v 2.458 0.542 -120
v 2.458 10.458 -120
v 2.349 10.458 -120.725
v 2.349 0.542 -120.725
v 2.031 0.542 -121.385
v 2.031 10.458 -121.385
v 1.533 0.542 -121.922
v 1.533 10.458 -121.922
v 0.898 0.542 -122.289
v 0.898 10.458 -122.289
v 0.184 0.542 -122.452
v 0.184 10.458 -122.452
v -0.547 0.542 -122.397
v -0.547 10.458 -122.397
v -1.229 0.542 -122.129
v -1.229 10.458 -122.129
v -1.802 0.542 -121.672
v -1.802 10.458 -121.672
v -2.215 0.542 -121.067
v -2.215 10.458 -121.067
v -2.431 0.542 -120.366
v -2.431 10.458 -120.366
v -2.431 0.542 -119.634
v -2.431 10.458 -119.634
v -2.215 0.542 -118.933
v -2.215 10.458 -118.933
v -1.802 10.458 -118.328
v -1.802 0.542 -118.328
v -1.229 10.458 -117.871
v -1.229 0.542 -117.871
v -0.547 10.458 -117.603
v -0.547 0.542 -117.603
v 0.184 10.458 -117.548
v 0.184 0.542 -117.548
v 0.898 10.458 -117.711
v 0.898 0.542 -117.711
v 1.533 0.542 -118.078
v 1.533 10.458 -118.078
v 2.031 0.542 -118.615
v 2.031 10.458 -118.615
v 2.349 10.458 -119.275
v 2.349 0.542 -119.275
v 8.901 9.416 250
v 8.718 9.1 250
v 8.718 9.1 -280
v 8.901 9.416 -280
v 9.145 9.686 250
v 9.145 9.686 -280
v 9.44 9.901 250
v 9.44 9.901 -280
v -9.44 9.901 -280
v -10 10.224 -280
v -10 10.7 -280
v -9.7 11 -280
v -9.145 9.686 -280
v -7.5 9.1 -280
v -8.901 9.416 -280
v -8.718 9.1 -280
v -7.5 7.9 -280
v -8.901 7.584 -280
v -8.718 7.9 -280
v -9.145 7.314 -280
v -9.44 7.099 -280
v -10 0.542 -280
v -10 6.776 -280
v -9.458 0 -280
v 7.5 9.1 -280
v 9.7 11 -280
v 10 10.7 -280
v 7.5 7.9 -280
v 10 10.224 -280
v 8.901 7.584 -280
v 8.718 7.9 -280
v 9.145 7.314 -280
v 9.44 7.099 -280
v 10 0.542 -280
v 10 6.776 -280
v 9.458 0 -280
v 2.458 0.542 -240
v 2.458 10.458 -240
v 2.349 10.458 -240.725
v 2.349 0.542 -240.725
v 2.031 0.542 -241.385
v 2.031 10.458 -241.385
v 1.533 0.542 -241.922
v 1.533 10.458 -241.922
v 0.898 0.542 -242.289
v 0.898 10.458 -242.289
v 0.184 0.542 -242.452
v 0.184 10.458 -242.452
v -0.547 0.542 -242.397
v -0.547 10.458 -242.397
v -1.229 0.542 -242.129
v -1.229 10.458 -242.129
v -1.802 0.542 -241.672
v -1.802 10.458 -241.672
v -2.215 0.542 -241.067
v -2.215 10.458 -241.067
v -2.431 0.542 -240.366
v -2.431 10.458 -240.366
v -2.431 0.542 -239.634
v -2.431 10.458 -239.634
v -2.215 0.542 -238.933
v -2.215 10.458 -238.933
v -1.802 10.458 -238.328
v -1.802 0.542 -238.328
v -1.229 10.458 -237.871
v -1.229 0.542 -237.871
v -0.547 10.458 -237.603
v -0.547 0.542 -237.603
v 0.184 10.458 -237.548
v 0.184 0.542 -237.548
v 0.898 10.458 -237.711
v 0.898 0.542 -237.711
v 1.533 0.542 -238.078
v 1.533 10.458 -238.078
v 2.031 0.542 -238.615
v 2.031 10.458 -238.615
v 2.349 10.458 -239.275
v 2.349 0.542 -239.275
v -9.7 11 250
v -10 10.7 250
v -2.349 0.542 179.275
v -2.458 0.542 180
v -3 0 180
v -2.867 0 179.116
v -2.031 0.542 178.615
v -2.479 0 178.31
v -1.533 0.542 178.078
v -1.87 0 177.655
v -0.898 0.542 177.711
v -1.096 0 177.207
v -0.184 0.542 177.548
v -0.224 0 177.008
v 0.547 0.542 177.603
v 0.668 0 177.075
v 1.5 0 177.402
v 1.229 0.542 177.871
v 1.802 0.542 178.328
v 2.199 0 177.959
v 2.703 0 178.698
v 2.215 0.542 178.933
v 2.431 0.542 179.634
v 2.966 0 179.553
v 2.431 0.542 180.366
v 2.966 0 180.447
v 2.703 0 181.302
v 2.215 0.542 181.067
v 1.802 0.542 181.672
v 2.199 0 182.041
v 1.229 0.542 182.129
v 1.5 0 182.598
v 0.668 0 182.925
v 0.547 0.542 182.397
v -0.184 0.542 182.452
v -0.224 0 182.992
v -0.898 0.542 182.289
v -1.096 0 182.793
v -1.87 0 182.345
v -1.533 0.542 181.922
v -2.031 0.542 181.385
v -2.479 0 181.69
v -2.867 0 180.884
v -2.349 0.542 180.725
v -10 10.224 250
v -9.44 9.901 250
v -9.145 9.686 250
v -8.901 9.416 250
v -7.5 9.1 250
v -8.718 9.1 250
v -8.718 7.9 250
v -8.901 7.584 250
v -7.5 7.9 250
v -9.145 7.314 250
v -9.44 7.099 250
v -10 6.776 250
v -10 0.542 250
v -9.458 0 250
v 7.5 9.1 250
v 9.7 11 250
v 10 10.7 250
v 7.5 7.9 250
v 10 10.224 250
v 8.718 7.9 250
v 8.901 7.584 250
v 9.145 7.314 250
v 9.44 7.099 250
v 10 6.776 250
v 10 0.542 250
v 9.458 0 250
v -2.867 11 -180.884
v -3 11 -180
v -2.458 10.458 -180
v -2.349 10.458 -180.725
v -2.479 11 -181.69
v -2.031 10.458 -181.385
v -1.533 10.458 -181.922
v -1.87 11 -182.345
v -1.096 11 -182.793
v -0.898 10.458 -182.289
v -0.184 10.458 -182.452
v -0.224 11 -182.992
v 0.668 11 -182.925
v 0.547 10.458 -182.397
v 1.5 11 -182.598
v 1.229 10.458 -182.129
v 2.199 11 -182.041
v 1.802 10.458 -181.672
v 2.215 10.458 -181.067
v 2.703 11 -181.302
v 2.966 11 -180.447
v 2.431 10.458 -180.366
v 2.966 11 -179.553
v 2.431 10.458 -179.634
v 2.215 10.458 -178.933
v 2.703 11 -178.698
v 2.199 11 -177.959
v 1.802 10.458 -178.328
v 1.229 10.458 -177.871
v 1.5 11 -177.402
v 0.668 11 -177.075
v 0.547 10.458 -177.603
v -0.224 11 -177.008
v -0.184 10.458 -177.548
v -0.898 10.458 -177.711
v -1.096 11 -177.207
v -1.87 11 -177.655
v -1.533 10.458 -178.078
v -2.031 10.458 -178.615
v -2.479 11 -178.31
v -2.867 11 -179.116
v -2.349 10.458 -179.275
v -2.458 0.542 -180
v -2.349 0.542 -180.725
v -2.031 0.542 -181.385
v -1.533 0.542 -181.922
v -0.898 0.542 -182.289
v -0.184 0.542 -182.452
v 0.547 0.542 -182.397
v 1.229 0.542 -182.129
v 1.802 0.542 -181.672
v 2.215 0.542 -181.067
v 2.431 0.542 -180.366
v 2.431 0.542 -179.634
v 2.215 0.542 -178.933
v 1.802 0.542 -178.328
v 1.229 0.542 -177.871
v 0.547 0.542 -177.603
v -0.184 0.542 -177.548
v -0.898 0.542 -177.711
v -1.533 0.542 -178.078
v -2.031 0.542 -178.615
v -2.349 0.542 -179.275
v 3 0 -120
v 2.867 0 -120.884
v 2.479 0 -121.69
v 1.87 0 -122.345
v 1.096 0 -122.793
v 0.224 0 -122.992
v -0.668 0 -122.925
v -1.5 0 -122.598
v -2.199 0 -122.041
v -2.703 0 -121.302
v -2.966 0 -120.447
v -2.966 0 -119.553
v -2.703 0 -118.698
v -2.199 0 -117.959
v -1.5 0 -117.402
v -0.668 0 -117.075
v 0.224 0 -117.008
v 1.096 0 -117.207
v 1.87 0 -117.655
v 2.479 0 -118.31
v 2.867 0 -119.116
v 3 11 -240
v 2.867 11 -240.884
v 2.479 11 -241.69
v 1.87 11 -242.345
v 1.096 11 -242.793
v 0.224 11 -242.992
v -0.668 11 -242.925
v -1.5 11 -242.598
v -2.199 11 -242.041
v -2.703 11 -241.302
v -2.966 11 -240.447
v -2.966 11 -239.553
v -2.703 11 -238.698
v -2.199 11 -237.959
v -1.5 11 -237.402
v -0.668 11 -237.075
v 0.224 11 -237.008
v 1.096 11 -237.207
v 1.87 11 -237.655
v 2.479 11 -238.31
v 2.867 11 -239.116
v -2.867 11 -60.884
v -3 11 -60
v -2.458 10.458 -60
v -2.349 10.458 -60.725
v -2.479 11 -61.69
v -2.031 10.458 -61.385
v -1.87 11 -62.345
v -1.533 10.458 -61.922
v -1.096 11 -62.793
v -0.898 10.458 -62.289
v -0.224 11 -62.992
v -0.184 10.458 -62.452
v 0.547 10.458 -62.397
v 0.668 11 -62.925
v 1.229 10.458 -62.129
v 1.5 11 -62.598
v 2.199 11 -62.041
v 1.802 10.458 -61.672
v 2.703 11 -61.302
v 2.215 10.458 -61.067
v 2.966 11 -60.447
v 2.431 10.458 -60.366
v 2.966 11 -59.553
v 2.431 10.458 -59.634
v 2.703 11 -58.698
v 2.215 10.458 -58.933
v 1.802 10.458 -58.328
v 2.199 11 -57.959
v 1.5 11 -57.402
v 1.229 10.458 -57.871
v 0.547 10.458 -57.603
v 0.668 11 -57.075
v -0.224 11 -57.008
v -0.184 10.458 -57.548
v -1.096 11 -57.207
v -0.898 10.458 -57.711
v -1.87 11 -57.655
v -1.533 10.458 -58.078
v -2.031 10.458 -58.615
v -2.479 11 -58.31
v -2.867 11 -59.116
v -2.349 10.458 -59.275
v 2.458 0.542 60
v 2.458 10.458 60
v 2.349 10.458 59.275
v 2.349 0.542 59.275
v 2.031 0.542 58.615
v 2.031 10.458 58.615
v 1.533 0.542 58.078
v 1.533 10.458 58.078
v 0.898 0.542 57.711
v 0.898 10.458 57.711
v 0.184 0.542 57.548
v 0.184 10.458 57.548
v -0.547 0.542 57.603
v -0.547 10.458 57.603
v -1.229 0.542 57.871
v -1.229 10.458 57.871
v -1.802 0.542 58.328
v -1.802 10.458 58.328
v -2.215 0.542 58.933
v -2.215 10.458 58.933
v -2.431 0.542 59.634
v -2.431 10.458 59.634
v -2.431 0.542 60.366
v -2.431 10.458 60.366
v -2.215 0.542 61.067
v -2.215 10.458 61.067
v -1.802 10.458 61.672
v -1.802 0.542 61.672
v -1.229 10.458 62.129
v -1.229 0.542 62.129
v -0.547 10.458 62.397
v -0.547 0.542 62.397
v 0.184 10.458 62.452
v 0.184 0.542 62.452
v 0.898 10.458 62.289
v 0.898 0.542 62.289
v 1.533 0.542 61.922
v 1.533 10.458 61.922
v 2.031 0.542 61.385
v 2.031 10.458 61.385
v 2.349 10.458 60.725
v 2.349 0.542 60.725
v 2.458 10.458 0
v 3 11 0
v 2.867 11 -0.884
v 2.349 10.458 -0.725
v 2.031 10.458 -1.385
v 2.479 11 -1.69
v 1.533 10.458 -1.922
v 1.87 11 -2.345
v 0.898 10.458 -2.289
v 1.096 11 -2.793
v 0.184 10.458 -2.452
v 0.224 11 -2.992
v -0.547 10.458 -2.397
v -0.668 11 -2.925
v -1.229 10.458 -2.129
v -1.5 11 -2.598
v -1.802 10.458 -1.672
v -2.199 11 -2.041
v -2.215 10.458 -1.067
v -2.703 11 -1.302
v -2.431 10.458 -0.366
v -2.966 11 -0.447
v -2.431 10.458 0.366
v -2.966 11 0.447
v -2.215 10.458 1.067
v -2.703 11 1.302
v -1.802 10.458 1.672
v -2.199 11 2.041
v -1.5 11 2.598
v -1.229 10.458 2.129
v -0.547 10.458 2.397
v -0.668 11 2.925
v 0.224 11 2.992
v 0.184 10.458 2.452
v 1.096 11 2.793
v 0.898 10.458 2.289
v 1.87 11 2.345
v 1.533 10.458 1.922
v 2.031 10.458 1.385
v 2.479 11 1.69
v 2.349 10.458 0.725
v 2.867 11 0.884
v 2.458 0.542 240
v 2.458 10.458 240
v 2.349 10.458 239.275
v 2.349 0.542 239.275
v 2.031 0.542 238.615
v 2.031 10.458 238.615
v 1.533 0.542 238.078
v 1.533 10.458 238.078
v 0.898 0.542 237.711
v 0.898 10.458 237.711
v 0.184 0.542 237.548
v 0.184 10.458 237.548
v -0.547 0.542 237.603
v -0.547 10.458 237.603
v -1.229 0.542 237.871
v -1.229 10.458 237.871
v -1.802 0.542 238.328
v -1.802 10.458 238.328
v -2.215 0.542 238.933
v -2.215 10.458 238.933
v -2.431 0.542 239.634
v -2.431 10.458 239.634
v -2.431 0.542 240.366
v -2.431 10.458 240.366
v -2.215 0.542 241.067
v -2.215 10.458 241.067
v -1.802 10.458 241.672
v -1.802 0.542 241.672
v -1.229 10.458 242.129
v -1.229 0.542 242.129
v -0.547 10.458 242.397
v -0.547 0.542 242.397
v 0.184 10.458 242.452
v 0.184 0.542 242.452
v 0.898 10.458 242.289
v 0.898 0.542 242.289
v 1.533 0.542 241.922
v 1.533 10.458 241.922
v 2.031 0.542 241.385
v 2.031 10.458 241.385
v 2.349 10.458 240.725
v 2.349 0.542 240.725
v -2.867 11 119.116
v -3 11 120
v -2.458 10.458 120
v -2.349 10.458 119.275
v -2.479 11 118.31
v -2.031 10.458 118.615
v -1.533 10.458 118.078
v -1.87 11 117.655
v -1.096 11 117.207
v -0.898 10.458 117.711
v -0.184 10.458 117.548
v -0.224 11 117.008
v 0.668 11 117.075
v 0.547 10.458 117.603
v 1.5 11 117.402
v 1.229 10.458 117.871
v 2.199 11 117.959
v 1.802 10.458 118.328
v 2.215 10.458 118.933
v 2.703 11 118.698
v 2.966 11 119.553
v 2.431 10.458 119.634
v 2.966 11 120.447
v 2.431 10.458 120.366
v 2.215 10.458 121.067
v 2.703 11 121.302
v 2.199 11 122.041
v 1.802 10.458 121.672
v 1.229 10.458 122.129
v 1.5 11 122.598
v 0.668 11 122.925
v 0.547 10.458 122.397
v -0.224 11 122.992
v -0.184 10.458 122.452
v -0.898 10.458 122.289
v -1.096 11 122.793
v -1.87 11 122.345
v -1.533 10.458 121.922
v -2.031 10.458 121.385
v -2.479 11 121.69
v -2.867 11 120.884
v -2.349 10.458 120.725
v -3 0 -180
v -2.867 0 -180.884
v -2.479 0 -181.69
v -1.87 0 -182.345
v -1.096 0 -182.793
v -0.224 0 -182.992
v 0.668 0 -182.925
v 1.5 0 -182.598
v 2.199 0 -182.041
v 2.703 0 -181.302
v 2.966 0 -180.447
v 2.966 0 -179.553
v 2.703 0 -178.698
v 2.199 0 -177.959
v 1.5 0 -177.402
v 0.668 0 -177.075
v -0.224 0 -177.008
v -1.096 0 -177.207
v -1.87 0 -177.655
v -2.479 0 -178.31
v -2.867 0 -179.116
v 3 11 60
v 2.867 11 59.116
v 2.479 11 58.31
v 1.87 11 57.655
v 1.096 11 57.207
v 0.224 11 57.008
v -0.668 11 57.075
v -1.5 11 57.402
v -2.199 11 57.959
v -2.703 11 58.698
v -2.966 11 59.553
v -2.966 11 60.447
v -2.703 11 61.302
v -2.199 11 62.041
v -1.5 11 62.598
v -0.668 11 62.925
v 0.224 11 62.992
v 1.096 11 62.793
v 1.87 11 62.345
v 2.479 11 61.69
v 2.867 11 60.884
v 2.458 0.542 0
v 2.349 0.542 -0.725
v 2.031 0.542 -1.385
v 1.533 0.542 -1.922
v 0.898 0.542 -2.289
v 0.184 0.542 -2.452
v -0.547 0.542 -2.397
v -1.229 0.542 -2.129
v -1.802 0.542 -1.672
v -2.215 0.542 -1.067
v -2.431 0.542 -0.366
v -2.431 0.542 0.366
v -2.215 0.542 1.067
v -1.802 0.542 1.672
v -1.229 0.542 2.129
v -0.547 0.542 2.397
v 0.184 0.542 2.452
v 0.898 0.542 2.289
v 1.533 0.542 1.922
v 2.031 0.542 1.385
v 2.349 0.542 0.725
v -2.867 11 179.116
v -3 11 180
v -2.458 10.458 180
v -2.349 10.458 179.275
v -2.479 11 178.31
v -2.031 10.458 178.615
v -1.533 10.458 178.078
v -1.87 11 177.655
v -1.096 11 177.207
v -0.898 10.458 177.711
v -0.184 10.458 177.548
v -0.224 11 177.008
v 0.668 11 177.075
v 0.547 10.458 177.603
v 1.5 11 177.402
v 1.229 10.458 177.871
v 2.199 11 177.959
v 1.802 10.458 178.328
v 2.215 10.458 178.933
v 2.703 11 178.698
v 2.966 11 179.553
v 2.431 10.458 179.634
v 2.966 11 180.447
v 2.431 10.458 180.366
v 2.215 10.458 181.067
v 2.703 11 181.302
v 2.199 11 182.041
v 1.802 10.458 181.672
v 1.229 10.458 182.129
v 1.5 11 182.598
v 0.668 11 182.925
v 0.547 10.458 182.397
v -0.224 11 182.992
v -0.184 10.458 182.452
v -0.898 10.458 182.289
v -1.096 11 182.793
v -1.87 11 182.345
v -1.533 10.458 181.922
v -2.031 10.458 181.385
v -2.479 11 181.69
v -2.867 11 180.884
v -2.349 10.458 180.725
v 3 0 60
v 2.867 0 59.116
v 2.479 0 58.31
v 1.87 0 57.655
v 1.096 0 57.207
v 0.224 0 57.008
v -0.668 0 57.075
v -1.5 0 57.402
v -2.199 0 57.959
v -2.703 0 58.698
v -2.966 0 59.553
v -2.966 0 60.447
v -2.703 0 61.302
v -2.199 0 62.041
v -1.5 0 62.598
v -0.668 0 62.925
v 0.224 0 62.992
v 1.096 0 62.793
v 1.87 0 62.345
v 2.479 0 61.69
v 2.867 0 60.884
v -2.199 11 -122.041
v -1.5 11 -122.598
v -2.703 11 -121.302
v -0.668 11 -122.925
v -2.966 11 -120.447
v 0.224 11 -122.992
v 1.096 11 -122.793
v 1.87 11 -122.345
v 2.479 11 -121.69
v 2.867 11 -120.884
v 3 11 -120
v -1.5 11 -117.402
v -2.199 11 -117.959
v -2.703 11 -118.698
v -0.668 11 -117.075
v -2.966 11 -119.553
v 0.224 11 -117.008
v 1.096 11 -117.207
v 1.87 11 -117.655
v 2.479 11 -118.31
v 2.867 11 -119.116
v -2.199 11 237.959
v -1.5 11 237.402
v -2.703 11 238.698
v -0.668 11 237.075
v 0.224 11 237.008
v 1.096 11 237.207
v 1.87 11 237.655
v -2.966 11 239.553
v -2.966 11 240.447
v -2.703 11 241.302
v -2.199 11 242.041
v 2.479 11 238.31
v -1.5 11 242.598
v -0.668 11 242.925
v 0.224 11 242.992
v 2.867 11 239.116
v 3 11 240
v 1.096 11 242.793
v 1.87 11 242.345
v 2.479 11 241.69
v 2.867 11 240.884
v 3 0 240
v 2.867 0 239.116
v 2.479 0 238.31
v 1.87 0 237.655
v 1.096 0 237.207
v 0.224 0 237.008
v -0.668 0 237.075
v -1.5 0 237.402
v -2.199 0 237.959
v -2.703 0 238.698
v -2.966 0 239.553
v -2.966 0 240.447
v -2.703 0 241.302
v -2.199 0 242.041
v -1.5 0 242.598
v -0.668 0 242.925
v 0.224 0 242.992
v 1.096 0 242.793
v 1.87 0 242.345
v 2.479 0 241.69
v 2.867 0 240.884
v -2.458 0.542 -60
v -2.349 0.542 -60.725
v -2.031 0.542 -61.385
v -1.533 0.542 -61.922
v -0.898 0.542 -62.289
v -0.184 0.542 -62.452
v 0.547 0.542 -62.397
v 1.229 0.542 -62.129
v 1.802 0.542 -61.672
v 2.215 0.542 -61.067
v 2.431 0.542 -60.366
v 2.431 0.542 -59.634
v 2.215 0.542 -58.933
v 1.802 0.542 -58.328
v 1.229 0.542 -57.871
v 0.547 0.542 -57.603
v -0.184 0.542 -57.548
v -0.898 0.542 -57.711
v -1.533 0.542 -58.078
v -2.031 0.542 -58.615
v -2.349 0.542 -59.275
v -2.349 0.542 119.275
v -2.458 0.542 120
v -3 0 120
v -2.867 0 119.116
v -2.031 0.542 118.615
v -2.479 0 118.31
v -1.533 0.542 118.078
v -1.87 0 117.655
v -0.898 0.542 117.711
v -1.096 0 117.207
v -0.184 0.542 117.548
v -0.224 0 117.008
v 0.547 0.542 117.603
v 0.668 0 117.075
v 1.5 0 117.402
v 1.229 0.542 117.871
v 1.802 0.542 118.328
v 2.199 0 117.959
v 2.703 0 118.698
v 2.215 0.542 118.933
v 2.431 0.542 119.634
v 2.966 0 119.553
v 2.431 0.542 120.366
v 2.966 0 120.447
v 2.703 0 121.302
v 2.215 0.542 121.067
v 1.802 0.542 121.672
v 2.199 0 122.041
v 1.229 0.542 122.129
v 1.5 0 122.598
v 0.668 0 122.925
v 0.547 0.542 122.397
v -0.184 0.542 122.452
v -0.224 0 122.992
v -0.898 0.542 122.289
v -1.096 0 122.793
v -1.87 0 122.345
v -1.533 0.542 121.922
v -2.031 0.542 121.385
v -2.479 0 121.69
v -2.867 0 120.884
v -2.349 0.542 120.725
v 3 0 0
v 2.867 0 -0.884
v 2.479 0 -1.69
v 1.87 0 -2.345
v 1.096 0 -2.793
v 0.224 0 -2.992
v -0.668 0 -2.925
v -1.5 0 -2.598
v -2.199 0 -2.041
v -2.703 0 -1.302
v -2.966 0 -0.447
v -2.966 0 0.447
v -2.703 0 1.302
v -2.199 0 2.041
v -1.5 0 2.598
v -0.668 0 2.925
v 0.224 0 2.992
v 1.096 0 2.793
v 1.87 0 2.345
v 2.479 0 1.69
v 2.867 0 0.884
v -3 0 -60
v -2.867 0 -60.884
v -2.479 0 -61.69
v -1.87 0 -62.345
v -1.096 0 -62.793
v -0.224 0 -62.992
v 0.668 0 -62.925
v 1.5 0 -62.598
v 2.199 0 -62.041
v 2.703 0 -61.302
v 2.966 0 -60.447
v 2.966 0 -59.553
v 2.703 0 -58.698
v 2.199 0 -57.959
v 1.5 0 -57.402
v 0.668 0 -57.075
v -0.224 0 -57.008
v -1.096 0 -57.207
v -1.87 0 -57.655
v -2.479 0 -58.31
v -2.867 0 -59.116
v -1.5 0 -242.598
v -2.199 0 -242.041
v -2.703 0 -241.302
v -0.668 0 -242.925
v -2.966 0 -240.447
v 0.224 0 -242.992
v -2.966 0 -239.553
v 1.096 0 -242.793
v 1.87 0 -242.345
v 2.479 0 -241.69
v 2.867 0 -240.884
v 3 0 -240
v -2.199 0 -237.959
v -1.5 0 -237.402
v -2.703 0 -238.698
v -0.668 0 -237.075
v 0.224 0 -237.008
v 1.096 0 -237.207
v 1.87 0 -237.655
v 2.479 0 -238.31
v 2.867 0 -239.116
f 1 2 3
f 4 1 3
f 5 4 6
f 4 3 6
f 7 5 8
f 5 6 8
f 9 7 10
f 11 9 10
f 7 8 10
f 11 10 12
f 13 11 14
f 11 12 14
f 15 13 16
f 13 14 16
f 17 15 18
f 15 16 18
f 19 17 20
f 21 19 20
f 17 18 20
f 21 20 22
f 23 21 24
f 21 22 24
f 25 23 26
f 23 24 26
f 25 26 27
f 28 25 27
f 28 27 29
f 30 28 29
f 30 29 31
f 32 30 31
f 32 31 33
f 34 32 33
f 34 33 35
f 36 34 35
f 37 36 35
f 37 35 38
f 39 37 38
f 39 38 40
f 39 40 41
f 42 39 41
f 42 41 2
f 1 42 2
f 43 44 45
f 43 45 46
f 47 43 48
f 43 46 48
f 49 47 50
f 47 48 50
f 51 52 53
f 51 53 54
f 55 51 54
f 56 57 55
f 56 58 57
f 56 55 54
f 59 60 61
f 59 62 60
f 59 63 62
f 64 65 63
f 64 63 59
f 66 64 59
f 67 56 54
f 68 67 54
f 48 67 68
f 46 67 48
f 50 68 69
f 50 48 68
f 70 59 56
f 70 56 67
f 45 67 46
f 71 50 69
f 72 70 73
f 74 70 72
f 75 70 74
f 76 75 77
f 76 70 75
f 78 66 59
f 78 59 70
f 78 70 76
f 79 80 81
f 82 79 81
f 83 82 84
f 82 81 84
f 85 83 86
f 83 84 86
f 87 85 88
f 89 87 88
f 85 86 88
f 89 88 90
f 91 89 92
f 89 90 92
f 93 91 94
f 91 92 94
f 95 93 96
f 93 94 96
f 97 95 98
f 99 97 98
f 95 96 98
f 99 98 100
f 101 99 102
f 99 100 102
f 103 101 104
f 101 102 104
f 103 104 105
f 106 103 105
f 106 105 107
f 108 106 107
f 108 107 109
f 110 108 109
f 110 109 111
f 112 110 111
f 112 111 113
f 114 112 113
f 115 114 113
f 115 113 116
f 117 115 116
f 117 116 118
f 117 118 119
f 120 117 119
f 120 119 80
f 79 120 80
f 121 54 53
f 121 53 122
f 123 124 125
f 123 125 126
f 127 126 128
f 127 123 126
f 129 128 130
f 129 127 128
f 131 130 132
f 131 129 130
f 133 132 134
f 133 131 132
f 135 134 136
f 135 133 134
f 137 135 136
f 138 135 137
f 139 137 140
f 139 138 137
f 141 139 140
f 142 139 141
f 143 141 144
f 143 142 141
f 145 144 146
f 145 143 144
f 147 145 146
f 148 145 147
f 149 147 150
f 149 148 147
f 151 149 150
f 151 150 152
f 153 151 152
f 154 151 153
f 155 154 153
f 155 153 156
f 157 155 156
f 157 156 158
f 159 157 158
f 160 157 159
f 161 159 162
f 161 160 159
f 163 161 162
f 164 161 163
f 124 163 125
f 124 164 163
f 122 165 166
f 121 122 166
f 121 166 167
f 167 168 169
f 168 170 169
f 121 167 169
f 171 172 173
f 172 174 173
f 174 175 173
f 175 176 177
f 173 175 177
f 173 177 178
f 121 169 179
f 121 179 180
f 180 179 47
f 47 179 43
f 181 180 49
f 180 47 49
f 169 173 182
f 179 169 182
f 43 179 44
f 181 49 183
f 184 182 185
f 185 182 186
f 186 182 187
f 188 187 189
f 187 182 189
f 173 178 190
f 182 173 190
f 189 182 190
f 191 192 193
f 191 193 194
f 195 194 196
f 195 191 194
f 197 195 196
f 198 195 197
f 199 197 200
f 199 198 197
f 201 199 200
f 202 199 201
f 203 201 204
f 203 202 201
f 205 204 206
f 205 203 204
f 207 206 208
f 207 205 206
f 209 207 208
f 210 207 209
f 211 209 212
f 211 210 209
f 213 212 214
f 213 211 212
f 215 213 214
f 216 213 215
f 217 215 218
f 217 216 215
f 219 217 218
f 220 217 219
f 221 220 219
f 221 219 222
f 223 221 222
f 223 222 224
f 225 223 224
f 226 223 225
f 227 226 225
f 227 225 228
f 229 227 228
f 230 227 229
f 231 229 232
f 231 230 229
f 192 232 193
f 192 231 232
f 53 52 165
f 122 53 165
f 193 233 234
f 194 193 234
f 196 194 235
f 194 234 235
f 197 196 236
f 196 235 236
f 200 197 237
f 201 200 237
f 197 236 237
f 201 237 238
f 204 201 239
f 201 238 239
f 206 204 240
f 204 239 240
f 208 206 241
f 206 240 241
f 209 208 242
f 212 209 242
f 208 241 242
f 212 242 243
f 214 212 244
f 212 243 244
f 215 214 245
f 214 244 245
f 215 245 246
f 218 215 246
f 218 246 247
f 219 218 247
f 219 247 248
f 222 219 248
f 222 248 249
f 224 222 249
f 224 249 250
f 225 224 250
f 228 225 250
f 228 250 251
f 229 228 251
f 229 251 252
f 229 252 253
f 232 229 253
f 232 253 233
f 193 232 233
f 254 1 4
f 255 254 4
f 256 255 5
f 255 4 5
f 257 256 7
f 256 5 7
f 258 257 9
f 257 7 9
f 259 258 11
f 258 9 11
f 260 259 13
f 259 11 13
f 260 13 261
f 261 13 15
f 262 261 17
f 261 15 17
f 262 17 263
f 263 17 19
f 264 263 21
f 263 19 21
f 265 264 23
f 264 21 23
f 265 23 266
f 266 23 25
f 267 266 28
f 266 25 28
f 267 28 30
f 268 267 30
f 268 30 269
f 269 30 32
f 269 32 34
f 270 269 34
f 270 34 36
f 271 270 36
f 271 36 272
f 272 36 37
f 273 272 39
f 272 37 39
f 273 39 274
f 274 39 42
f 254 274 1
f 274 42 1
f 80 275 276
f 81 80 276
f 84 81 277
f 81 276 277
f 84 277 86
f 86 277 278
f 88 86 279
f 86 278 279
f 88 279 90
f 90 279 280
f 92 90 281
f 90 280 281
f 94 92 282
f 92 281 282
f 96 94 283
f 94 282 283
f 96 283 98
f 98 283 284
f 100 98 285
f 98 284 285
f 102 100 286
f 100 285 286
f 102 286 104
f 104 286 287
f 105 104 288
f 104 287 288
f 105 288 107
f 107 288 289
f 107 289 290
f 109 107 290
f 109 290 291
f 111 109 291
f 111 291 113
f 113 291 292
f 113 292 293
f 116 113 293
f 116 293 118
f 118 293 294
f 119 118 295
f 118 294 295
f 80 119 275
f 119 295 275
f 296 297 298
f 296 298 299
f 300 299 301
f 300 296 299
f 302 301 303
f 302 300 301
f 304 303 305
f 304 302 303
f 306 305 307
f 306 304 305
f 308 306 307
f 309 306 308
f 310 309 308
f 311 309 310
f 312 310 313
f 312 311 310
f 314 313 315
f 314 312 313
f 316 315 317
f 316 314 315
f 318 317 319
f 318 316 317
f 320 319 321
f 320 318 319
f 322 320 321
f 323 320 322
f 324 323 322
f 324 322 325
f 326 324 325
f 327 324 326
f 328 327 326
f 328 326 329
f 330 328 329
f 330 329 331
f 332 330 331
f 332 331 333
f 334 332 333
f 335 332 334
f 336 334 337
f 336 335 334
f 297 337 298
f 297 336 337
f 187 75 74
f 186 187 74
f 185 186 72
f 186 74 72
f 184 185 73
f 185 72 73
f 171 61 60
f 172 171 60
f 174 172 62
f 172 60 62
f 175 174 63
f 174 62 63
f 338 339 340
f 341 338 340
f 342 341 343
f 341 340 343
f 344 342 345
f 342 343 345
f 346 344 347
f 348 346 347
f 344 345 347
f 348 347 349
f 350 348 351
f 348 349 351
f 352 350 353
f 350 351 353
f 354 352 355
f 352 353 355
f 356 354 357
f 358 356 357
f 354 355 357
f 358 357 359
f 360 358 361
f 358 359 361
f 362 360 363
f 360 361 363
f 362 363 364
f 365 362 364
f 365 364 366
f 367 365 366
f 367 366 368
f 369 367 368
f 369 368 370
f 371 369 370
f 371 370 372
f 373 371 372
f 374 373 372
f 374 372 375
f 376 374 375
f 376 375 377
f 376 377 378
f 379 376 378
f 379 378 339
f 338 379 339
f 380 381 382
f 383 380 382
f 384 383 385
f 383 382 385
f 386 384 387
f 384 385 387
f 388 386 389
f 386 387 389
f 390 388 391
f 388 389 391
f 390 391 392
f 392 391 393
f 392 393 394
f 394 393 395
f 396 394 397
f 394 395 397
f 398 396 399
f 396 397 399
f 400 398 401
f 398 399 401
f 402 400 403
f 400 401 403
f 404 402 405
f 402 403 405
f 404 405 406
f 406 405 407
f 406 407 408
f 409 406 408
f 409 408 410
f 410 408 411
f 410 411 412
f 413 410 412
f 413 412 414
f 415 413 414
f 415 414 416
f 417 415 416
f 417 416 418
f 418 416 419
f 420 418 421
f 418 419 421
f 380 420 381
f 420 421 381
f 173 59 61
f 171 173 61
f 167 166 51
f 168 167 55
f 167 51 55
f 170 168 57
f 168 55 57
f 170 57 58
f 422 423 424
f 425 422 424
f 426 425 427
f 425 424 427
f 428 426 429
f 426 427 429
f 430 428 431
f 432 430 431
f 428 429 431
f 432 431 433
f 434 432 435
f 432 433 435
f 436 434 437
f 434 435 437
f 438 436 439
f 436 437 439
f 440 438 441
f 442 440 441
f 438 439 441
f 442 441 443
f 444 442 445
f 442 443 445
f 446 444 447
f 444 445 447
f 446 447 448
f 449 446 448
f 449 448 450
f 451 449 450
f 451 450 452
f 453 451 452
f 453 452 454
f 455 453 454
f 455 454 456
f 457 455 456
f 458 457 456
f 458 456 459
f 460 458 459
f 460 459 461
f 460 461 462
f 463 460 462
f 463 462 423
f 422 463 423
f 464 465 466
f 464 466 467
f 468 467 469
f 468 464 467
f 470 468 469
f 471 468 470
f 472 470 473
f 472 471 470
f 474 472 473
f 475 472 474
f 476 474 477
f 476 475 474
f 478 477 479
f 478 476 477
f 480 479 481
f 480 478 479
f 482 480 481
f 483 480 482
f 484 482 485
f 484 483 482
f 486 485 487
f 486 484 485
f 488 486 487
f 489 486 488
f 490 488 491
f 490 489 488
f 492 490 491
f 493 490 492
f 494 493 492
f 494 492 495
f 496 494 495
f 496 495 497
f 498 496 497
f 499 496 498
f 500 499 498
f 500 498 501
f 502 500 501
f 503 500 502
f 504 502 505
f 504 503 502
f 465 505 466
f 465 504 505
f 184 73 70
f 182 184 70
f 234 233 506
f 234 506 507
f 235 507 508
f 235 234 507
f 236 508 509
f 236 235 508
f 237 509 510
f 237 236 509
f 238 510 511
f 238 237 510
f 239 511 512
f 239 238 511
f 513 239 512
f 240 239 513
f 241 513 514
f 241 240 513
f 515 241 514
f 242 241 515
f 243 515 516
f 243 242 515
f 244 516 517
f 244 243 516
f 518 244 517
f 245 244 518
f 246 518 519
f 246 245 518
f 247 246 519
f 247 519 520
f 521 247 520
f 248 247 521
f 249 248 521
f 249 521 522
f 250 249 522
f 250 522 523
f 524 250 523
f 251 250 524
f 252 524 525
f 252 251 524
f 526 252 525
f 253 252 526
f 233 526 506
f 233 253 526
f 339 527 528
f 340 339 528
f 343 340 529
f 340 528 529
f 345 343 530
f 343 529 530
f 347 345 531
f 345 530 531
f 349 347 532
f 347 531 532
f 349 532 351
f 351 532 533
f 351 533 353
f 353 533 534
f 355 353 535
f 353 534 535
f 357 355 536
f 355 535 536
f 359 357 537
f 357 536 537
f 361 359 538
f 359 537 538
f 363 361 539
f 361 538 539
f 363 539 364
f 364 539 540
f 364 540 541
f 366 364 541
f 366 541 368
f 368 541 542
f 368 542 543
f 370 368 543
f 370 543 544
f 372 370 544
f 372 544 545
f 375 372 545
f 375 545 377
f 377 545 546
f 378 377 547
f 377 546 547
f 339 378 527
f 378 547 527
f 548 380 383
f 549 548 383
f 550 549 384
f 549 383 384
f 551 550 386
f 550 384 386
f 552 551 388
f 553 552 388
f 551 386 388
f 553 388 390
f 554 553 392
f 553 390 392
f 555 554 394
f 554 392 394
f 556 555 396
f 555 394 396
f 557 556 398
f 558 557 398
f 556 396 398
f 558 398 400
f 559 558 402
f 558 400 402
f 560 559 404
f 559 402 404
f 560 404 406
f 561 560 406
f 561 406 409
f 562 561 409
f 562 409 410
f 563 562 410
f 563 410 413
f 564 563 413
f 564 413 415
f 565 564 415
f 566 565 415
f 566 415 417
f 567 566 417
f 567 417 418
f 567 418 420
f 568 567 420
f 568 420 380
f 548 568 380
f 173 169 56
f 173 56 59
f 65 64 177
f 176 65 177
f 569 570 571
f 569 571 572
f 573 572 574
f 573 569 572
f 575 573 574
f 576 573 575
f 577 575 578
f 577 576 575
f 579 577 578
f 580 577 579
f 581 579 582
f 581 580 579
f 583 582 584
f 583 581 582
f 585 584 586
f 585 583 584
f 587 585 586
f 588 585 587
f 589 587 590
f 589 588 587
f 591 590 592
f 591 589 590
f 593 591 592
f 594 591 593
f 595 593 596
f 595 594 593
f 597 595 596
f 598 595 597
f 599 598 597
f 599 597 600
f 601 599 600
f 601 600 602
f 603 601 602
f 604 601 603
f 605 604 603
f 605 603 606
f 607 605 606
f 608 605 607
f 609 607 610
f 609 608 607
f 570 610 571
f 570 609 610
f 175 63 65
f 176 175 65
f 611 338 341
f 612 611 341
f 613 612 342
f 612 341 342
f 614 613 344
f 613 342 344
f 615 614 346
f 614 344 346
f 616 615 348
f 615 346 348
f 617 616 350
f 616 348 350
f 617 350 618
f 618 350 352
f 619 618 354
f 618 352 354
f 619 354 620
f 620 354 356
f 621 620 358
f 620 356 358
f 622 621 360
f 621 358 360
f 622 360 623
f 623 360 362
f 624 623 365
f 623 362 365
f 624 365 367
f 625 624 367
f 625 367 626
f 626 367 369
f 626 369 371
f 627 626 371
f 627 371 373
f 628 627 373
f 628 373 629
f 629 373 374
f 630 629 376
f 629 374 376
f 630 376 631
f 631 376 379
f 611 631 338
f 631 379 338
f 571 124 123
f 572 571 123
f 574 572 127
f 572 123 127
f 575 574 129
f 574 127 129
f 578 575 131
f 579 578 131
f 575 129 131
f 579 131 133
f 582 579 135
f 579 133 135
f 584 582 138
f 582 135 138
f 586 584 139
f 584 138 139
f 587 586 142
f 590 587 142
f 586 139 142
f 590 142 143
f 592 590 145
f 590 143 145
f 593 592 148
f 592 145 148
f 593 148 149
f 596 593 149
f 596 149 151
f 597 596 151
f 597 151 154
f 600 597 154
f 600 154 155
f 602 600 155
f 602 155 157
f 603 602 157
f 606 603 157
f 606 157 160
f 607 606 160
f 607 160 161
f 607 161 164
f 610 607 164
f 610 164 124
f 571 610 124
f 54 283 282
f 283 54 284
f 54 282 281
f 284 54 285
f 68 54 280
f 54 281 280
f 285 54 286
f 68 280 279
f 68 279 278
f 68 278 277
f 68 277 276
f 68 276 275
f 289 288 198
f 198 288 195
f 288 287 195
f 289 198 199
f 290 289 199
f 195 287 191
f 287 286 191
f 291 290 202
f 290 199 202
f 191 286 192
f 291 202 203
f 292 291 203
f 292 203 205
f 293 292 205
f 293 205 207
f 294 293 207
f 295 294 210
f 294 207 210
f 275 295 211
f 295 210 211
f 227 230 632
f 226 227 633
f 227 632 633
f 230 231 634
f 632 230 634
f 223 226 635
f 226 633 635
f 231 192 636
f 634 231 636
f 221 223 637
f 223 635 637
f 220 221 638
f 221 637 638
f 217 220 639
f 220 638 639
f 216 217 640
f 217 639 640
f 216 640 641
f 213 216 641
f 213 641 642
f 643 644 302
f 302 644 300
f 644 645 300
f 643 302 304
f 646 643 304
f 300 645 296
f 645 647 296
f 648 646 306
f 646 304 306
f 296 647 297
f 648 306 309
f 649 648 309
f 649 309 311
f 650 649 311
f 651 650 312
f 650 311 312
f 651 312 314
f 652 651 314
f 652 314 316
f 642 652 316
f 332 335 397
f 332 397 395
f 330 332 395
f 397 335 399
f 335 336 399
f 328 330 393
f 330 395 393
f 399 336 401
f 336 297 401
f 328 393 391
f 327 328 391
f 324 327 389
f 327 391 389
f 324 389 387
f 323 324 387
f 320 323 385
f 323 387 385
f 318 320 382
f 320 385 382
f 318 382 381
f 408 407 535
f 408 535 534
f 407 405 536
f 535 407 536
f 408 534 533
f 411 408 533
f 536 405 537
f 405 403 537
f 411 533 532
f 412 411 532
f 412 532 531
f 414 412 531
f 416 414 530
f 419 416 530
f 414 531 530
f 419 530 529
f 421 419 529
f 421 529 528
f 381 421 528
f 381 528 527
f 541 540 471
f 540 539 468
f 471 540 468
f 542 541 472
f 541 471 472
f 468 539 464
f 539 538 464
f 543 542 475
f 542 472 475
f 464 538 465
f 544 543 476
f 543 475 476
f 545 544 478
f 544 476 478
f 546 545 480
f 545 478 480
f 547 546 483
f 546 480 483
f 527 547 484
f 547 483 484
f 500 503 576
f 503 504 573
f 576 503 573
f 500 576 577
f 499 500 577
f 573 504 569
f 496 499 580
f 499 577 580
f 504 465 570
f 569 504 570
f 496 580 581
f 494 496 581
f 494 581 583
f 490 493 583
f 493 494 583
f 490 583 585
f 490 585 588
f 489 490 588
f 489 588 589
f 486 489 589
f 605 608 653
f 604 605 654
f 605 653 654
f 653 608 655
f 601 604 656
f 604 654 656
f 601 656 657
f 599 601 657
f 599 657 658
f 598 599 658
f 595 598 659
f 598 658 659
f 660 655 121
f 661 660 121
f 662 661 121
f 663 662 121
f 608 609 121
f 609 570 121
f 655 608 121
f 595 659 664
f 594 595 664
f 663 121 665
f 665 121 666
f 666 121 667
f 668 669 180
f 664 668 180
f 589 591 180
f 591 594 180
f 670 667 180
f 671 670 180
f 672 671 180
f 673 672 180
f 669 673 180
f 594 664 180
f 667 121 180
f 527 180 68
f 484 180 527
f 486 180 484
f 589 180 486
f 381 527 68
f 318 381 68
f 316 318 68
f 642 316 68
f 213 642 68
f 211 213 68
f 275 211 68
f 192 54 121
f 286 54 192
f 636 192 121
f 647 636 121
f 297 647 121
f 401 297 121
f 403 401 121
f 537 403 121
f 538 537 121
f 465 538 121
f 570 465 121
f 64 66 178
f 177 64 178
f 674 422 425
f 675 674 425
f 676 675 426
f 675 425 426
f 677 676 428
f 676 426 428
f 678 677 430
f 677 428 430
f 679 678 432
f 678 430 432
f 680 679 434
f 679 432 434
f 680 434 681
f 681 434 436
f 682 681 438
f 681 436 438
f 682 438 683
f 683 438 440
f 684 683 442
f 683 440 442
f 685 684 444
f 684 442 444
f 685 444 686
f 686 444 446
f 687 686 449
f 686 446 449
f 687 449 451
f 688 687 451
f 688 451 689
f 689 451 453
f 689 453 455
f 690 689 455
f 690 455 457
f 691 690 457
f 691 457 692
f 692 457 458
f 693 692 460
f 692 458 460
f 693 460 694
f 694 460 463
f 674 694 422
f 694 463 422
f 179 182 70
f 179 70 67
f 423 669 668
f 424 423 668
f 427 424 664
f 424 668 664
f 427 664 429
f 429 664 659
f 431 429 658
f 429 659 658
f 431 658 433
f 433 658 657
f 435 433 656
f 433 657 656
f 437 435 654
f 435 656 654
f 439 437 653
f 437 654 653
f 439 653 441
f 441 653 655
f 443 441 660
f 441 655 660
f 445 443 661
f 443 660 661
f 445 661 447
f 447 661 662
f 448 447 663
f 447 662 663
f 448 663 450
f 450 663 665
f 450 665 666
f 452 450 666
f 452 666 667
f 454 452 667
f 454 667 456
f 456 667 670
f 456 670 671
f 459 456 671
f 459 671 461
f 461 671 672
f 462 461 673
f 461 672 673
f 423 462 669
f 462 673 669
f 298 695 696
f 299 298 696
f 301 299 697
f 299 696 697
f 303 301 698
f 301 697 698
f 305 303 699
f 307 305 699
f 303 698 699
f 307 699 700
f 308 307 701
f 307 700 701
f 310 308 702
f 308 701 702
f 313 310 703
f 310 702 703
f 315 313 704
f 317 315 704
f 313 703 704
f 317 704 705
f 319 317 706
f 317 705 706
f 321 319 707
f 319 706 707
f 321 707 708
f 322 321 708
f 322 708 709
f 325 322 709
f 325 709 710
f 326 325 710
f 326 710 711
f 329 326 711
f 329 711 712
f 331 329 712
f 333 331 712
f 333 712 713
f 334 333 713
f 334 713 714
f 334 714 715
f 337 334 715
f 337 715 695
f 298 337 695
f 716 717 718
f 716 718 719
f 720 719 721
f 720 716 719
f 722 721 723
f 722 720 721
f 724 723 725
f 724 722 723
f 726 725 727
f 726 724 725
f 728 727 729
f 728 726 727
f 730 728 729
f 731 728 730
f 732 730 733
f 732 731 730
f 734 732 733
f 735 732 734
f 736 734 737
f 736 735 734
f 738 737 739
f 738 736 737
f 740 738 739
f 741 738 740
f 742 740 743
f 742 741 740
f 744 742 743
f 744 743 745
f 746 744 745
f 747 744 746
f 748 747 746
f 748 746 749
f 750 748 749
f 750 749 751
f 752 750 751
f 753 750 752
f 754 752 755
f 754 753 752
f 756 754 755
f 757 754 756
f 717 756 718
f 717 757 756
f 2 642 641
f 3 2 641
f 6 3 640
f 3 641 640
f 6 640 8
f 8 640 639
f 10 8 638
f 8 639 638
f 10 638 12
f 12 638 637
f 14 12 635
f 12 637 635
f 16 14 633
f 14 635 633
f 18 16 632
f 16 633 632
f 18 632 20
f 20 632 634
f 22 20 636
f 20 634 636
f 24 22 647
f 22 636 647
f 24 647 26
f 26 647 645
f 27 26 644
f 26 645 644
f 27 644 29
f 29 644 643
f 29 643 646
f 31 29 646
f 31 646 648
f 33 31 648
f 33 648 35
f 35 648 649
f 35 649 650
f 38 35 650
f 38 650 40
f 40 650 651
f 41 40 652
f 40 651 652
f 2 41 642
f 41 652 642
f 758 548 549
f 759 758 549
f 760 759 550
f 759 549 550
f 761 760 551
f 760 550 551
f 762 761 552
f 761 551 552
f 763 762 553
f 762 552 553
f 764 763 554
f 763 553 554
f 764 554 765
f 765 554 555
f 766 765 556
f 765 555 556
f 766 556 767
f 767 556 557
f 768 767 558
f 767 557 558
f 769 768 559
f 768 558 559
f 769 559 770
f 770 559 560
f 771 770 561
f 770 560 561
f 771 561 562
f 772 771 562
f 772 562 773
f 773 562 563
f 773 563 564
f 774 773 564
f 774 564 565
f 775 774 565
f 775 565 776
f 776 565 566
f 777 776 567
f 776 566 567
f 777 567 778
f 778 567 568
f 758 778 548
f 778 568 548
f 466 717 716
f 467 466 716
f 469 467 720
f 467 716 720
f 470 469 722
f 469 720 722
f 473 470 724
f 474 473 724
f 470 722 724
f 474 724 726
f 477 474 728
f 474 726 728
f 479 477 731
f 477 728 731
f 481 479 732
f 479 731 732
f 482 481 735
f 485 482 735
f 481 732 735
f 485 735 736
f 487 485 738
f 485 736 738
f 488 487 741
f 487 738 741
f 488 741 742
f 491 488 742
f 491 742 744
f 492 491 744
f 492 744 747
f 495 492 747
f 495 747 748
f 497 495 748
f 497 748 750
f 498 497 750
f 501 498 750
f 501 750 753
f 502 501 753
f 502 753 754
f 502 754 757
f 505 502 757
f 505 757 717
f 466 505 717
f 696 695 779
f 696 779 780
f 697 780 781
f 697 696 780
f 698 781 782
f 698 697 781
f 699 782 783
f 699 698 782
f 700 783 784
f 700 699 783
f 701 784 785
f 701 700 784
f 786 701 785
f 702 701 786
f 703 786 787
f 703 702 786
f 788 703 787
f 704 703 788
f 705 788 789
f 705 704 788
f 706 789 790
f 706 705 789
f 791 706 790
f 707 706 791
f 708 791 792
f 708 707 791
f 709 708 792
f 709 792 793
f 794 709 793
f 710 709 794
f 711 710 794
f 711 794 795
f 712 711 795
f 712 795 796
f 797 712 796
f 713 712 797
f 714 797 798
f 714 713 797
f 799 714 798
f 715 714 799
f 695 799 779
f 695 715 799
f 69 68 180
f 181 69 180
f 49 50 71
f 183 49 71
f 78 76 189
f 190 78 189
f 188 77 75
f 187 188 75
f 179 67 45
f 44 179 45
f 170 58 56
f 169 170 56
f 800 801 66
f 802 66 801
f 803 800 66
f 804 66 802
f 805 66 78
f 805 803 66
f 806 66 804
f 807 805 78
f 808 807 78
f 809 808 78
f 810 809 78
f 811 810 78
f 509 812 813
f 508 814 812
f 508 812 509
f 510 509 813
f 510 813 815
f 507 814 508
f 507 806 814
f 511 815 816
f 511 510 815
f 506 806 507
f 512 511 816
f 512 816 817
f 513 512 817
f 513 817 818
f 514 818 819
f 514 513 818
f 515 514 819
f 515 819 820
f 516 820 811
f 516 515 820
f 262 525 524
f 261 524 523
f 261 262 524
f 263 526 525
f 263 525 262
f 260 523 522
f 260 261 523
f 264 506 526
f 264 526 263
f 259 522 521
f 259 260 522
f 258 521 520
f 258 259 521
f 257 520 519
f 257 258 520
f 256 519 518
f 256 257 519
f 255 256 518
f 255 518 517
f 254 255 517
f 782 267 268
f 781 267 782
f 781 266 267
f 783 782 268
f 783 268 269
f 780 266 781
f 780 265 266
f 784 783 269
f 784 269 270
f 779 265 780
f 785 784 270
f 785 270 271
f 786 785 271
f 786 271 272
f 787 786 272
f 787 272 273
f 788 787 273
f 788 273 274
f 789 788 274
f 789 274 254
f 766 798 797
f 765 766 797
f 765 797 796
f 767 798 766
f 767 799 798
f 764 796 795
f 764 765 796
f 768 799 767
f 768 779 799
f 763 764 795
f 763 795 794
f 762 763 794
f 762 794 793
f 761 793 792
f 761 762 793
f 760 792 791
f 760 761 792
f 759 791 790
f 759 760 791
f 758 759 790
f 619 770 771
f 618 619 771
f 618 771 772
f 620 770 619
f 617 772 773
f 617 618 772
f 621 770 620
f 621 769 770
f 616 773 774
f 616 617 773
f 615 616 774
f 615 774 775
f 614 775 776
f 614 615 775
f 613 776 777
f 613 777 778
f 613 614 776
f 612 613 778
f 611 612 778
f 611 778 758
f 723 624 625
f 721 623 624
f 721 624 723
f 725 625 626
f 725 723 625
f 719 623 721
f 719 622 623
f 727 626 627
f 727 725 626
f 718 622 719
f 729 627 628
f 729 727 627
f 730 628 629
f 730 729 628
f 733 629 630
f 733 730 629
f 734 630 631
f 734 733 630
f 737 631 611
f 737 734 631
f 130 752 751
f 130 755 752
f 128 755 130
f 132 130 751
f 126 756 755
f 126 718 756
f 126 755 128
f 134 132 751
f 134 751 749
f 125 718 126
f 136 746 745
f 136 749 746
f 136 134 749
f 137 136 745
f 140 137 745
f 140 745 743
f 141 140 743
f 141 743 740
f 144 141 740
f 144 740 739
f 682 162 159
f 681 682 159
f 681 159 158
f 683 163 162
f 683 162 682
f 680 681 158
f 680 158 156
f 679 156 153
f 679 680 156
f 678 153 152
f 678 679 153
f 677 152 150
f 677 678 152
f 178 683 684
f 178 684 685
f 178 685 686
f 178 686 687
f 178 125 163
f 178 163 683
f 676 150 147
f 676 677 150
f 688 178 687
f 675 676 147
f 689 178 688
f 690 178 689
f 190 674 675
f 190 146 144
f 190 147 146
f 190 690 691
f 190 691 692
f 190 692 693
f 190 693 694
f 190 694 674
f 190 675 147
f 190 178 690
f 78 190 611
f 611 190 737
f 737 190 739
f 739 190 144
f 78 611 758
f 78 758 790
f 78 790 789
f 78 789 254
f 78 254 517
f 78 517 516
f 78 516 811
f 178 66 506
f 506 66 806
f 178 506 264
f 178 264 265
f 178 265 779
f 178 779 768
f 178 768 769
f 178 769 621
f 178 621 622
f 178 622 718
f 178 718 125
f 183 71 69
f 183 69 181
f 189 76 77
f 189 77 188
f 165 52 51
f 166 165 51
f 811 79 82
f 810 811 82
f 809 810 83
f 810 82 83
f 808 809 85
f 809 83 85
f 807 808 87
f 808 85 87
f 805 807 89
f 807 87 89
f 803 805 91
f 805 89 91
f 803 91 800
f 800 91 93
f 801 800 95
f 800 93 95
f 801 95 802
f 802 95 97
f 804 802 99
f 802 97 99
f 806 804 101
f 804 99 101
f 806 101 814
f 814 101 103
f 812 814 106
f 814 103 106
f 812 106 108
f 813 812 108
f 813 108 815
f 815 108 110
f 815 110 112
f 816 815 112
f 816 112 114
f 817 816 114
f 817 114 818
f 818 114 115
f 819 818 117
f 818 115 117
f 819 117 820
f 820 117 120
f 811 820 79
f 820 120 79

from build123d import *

# Parameters (mm, degrees)
ESQUISSE1_W             = 20
ESQUISSE1_H             = 530
BOSS_EXTRU_1_DEPTH      = 11
ENL_V_MAT_EXTRU_1_DEPTH = 531.208449574
ENL_V_MAT_EXTRU_2_DEPTH = 531.208449574
ENL_V_MAT_EXTRU_3_DEPTH = 531.208449574
ENL_V_MAT_EXTRU_4_DEPTH = 531.208449574
PER_AGE1_D              = 4.917
PER_AGE2_D              = 4.917
CHANFREIN1_SIZE         = 0.5415
CHANFREIN2_SIZE         = 0.3


with BuildPart() as part:
    # Esquisse1 → Boss.-Extru.1 (new body)
    with BuildSketch(Plane.XZ):
        with Locations((0, -15)):
            Rectangle(ESQUISSE1_W, ESQUISSE1_H)
    extrude(amount=-BOSS_EXTRU_1_DEPTH)

    # Esquisse2 → Enlèv. mat.-Extru.1 (cut, through all)
    with BuildSketch(Plane(origin=(0, 0, -280), x_dir=(-1, 0, 0), z_dir=(0, 0, -1))):
        with BuildLine():
            Line((10, 7.9), (10, 10.22385))
            Line((10, 10.22385), (9.440021531, 9.900556887))
            ThreePointArc((9.440021531, 9.900556887), (9.015681976, 9.557293765), (8.71772889, 9.1))
            Line((8.71772889, 9.1), (7.5, 9.1))
            Line((7.5, 9.1), (7.5, 7.9))
            Line((7.5, 7.9), (10, 7.9))
        make_face()
    extrude(amount=-ENL_V_MAT_EXTRU_1_DEPTH, mode=Mode.SUBTRACT)

    # Esquisse3 → Enlèv. mat.-Extru.2 (cut, through all)
    with BuildSketch(Plane(origin=(0, 0, -280), x_dir=(-1, 0, 0), z_dir=(0, 0, -1))):
        with BuildLine():
            Line((9.440021531, 7.099443113), (10, 6.77615))
            Line((10, 6.77615), (10, 7.9))
            Line((10, 7.9), (8.71772889, 7.9))
            ThreePointArc((8.71772889, 7.9), (9.015681976, 7.442706235), (9.440021531, 7.099443113))
        make_face()
    extrude(amount=-ENL_V_MAT_EXTRU_2_DEPTH, mode=Mode.SUBTRACT)

    # Esquisse4 → Enlèv. mat.-Extru.3 (cut, through all)
    with BuildSketch(Plane(origin=(0, 0, -280), x_dir=(-1, 0, 0), z_dir=(0, 0, -1))):
        with BuildLine():
            Line((-10, 9.1), (-10, 6.77615))
            Line((-10, 6.77615), (-9.440021531, 7.099443113))
            ThreePointArc((-9.440021531, 7.099443113), (-9.015681976, 7.442706235), (-8.71772889, 7.9))
            Line((-8.71772889, 7.9), (-7.5, 7.9))
            Line((-7.5, 7.9), (-7.5, 9.1))
            Line((-7.5, 9.1), (-10, 9.1))
        make_face()
    extrude(amount=-ENL_V_MAT_EXTRU_3_DEPTH, mode=Mode.SUBTRACT)

    # Esquisse5 → Enlèv. mat.-Extru.4 (cut, through all)
    with BuildSketch(Plane(origin=(0, 0, -280), x_dir=(-1, 0, 0), z_dir=(0, 0, -1))):
        with BuildLine():
            Line((-9.440021531, 9.900556887), (-10, 10.22385))
            Line((-10, 10.22385), (-10, 9.1))
            Line((-10, 9.1), (-8.71772889, 9.1))
            ThreePointArc((-8.71772889, 9.1), (-9.015681976, 9.557293765), (-9.440021531, 9.900556887))
        make_face()
    extrude(amount=-ENL_V_MAT_EXTRU_4_DEPTH, mode=Mode.SUBTRACT)

    # Perçage1 (through all)
    with Locations(Plane(origin=(0, 11, 0), x_dir=(1, 0, 0), z_dir=(0, 1, 0))):
        with Locations((0, -180), (0, -120), (0, 60), (0, 180)):
            Hole(PER_AGE1_D / 2)

    # Perçage2 (through all)
    with Locations(Plane(origin=(0, 0, 0), x_dir=(-1, 0, 0), z_dir=(0, -1, 0))):
        with Locations((0, -240), (0, -60), (0, 0), (0, 120), (0, 240)):
            Hole(PER_AGE2_D / 2)

    # Chanfrein1
    chanfrein1_edges = [part.edges().sort_by_distance(p)[0] for p in [
        (2.4585, 11, 180),
        (2.4585, 0, 180),
        (-2.4585, 0, -240),
        (-2.4585, 11, -240),
        (-2.4585, 0, -120),
        (-2.4585, 11, -120),
        (-2.4585, 0, 0),
        (-2.4585, 11, 0),
        (-2.4585, 0, 60),
        (-2.4585, 11, 60),
        (-2.4585, 0, 240),
        (-2.4585, 11, 240),
        (10, 0, -15),
        (-10, 0, -15),
        (2.4585, 11, -180),
        (2.4585, 0, -180),
        (2.4585, 11, -60),
        (2.4585, 0, -60),
        (2.4585, 11, 120),
        (2.4585, 0, 120),
    ]]
    chamfer(chanfrein1_edges, length=CHANFREIN1_SIZE)

    # Chanfrein2
    chanfrein2_edges = [part.edges().sort_by_distance(p)[0] for p in [
        (10, 11, -15),
        (-10, 11, -15),
    ]]
    chamfer(chanfrein2_edges, length=CHANFREIN2_SIZE)


solid = part.part
